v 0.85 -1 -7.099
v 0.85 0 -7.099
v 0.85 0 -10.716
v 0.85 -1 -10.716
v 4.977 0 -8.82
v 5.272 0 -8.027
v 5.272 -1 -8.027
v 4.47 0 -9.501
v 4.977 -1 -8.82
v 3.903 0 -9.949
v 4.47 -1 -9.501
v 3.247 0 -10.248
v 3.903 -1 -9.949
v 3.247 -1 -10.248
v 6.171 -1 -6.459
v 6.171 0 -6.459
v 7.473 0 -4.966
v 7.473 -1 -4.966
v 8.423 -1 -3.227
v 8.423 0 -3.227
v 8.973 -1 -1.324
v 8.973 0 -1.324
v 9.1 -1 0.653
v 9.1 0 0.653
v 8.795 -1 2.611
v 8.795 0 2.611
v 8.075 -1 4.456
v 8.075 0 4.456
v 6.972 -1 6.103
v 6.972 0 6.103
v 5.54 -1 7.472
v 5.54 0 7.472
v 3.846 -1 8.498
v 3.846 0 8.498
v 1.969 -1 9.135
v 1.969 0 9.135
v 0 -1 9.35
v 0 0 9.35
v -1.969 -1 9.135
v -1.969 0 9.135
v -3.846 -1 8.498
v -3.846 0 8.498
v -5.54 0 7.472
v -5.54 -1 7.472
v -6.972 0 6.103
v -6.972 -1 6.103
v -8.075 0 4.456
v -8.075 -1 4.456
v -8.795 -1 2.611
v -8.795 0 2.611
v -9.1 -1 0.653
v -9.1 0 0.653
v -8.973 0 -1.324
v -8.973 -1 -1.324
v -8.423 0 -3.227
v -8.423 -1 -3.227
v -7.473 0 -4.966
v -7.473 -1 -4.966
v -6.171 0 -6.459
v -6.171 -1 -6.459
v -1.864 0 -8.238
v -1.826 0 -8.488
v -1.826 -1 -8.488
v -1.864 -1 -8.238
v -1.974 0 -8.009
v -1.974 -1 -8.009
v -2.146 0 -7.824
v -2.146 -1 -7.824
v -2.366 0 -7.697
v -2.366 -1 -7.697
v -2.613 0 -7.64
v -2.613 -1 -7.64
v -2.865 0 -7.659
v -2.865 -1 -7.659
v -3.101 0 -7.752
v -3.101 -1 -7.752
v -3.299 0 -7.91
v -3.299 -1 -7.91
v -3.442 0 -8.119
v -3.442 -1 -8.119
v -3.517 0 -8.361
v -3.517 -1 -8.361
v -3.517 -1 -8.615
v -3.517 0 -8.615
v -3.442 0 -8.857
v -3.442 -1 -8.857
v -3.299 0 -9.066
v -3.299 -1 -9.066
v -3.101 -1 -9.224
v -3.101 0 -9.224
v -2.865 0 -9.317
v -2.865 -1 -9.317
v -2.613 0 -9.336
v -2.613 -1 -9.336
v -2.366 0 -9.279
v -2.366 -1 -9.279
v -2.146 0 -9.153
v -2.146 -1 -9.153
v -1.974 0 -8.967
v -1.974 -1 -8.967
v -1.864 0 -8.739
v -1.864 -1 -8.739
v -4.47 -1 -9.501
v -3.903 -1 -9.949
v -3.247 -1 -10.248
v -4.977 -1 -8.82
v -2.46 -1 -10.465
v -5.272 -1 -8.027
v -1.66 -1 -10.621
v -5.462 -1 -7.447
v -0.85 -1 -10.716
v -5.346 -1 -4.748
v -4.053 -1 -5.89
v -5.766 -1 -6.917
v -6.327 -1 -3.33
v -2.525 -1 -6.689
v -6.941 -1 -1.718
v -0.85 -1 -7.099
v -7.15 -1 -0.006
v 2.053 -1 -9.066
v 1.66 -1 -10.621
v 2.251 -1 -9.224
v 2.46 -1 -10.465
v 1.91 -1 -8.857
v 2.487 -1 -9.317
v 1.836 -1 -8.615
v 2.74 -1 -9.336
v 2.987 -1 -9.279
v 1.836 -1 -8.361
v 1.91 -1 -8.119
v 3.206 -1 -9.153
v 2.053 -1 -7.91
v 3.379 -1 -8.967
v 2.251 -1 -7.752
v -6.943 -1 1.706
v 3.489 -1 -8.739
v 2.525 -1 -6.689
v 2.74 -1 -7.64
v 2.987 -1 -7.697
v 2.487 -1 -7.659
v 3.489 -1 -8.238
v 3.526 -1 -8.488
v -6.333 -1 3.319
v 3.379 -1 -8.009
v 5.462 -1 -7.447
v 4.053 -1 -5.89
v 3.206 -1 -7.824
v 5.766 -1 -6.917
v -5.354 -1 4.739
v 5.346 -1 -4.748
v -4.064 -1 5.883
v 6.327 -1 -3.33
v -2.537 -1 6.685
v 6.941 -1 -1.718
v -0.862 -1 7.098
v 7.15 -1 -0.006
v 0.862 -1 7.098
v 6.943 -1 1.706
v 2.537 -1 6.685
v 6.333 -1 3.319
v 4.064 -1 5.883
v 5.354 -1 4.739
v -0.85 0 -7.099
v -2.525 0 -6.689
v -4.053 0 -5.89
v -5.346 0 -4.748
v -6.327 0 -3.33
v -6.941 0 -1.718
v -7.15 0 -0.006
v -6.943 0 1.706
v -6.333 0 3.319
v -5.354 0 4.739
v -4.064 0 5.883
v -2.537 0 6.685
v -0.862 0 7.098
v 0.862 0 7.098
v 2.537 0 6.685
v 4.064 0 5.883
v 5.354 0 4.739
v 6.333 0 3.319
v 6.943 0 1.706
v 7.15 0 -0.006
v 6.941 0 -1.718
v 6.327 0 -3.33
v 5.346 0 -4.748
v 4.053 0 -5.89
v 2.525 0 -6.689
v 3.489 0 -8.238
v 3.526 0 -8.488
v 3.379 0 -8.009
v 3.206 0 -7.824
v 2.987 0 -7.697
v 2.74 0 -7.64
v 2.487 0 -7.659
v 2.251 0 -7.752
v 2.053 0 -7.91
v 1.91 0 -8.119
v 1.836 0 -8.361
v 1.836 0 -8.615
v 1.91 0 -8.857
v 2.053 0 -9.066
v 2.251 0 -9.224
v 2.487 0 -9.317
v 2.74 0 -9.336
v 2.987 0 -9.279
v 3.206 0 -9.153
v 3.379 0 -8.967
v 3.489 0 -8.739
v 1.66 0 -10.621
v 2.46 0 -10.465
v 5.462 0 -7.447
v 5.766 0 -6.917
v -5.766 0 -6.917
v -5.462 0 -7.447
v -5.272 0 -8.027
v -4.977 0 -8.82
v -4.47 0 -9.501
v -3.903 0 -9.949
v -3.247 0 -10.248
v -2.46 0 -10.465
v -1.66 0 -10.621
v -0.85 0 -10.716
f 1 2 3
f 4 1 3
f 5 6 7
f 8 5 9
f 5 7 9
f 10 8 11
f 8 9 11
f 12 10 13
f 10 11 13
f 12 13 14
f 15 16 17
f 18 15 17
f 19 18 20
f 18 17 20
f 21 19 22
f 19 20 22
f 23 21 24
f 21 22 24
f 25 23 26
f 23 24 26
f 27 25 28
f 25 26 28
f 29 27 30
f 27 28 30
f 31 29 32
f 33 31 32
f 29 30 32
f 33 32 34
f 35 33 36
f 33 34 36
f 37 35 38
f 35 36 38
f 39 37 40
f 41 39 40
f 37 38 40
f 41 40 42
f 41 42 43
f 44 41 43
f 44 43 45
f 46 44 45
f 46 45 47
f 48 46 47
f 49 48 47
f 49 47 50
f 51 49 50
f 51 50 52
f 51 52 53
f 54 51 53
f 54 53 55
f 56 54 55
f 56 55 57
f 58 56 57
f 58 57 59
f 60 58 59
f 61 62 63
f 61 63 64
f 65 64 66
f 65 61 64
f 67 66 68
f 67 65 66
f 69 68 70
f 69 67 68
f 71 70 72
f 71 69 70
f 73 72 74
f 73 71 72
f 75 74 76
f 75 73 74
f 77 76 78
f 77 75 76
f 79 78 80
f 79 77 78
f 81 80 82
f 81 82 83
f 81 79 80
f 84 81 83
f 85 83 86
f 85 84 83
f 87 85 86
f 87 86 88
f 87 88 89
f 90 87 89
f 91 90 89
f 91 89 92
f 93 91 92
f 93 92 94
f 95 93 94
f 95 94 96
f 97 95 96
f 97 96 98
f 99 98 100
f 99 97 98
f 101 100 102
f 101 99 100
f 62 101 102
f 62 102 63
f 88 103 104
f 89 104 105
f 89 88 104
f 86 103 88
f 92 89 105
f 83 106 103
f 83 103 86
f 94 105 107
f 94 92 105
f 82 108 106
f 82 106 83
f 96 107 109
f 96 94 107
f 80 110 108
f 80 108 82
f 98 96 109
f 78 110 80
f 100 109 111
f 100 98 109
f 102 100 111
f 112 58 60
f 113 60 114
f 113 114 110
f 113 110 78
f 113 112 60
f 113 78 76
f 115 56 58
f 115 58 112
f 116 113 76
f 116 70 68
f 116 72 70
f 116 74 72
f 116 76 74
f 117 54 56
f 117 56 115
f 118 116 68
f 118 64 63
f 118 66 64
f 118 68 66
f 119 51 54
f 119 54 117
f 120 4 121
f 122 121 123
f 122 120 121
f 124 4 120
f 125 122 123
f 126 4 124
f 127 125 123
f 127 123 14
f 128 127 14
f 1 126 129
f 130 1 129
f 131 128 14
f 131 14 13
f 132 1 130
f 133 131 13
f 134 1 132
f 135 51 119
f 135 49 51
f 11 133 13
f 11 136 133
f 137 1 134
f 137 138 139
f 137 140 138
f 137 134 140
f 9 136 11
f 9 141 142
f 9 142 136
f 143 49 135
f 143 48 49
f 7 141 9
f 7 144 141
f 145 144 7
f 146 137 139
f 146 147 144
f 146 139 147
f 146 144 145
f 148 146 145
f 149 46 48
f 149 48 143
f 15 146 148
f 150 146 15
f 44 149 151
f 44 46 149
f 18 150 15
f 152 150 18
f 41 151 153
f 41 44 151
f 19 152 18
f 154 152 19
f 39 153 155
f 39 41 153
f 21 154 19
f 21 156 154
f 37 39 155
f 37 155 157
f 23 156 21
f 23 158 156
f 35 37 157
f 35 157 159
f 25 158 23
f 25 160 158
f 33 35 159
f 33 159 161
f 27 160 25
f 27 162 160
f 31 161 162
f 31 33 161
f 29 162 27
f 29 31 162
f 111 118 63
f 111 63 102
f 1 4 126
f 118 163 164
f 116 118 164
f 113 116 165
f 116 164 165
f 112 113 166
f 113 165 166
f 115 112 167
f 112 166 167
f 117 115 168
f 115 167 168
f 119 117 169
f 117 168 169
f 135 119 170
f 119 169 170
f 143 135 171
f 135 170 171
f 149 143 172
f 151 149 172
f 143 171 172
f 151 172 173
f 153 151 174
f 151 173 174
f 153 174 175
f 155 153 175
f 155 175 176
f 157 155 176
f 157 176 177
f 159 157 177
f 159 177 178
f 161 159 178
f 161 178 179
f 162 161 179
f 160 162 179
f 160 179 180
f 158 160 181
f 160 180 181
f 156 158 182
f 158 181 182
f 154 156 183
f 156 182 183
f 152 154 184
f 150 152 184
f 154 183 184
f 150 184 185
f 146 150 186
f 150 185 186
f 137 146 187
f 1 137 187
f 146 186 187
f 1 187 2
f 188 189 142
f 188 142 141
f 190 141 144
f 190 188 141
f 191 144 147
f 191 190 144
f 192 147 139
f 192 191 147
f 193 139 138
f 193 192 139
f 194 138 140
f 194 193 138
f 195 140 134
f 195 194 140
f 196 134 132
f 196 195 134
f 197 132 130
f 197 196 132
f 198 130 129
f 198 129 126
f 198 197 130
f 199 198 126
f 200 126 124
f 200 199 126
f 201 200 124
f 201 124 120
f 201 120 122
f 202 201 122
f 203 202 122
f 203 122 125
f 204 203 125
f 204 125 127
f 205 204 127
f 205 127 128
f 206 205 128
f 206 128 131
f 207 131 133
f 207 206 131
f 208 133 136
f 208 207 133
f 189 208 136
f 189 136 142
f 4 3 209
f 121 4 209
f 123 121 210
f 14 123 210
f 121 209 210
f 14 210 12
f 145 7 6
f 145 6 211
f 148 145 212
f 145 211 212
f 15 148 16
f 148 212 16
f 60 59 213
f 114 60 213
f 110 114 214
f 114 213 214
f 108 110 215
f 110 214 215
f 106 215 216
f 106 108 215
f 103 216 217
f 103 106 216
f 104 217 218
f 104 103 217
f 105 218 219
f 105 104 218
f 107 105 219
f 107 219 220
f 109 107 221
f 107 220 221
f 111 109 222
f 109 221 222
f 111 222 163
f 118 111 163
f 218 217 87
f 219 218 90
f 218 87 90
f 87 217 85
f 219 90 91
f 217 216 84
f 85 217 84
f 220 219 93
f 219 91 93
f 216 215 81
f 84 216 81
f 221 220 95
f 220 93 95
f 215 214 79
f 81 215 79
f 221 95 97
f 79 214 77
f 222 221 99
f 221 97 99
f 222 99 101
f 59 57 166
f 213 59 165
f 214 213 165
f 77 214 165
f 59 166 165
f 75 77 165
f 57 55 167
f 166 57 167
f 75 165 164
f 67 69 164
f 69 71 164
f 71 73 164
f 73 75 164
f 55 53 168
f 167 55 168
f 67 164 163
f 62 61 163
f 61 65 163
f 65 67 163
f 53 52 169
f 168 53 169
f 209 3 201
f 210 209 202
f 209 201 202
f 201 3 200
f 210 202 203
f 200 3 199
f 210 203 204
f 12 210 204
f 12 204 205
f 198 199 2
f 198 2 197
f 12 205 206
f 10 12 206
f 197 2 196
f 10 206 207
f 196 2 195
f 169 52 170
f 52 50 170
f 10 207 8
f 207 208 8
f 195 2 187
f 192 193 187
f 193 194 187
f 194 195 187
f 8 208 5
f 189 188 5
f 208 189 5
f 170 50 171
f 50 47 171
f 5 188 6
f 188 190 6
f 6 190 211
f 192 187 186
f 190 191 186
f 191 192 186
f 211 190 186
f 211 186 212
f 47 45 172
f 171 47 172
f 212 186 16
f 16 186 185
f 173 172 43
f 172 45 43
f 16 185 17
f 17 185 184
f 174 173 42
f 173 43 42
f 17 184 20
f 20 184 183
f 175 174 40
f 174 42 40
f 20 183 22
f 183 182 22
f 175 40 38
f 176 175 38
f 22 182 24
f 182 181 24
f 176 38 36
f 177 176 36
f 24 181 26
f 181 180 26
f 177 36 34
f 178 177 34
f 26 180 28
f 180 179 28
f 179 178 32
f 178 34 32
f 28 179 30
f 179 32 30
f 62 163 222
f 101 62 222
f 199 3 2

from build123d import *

# Parameters (mm, degrees)
F0_R        = 0.85
F1_DEPTH    = 1
F2_T1_DEPTH = 1
F3_R        = 3


# Not quite as in the source:
# - a fillet or chamfer that OpenCascade refuses, or shapes differently, is made with other operations: its cross-section is extruded or revolved along the edge and cut away or added


with BuildPart() as f1:
    # F0 (on Front) → F1 (new body)
    with BuildSketch(Plane.XZ):
        with BuildLine():
            ThreePointArc((-0.85, -7.0992957397), (0, 7.15), (0.85, -7.0992957397))
            Line((0.85, -7.0992957397), (0.85, -10.7163426597))
            ThreePointArc((0.85, -10.7163426597), (3.1412802118, -10.2808004859), (5.2846966911, -9.3613290127))
            Line((5.2846966911, -9.3613290127), (4.5, -7.6785415282))
            ThreePointArc((4.5, -7.6785415282), (0, 9.3500403242), (-4.5, -7.6785415282))
            Line((-4.5, -7.6785415282), (-5.2846966911, -9.3613290127))
            ThreePointArc((-5.2846966911, -9.3613290127), (-3.1412802118, -10.2808004859), (-0.85, -10.7163426597))
            Line((-0.85, -10.7163426597), (-0.85, -7.0992957397))
        make_face()
        with Locations((-2.6762816156, -8.4880808617)):
            Circle(F0_R, mode=Mode.SUBTRACT)
        with Locations((2.6762816156, -8.4880808617)):
            Circle(F0_R, mode=Mode.SUBTRACT)
    extrude(amount=F1_DEPTH)

    # F2: fillet of radius 3 on 2 edges, made by hand

    # F2_s2 → F2_t1 (join)
    with BuildSketch(Plane.XZ):
        with BuildLine():
            ThreePointArc((-6.170677683, -6.4591691909), (-5.3337110531, -7.7899747588), (-5.2846966911, -9.3613290127))
            Line((-5.2846966911, -9.3613290127), (-4.5, -7.6785415282))
            ThreePointArc((-4.5, -7.6785415282), (-5.3700612452, -7.1164289704), (-6.170677683, -6.4591691909))
        make_face()
        with BuildLine():
            ThreePointArc((5.2846966911, -9.3613290127), (5.3337110531, -7.7899747588), (6.170677683, -6.4591691909))
            ThreePointArc((6.170677683, -6.4591691909), (5.3700612452, -7.1164289704), (4.5, -7.6785415282))
            Line((4.5, -7.6785415282), (5.2846966911, -9.3613290127))
        make_face()
    extrude(amount=F2_T1_DEPTH)

    # F3
    f3_edges = [f1.edges().sort_by_distance(p)[0] for p in [
        (-5.284697, -0.5, -9.361329),
        (5.284697, -0.5, -9.361329),
    ]]
    fillet(f3_edges, radius=F3_R)


solid = f1.part
